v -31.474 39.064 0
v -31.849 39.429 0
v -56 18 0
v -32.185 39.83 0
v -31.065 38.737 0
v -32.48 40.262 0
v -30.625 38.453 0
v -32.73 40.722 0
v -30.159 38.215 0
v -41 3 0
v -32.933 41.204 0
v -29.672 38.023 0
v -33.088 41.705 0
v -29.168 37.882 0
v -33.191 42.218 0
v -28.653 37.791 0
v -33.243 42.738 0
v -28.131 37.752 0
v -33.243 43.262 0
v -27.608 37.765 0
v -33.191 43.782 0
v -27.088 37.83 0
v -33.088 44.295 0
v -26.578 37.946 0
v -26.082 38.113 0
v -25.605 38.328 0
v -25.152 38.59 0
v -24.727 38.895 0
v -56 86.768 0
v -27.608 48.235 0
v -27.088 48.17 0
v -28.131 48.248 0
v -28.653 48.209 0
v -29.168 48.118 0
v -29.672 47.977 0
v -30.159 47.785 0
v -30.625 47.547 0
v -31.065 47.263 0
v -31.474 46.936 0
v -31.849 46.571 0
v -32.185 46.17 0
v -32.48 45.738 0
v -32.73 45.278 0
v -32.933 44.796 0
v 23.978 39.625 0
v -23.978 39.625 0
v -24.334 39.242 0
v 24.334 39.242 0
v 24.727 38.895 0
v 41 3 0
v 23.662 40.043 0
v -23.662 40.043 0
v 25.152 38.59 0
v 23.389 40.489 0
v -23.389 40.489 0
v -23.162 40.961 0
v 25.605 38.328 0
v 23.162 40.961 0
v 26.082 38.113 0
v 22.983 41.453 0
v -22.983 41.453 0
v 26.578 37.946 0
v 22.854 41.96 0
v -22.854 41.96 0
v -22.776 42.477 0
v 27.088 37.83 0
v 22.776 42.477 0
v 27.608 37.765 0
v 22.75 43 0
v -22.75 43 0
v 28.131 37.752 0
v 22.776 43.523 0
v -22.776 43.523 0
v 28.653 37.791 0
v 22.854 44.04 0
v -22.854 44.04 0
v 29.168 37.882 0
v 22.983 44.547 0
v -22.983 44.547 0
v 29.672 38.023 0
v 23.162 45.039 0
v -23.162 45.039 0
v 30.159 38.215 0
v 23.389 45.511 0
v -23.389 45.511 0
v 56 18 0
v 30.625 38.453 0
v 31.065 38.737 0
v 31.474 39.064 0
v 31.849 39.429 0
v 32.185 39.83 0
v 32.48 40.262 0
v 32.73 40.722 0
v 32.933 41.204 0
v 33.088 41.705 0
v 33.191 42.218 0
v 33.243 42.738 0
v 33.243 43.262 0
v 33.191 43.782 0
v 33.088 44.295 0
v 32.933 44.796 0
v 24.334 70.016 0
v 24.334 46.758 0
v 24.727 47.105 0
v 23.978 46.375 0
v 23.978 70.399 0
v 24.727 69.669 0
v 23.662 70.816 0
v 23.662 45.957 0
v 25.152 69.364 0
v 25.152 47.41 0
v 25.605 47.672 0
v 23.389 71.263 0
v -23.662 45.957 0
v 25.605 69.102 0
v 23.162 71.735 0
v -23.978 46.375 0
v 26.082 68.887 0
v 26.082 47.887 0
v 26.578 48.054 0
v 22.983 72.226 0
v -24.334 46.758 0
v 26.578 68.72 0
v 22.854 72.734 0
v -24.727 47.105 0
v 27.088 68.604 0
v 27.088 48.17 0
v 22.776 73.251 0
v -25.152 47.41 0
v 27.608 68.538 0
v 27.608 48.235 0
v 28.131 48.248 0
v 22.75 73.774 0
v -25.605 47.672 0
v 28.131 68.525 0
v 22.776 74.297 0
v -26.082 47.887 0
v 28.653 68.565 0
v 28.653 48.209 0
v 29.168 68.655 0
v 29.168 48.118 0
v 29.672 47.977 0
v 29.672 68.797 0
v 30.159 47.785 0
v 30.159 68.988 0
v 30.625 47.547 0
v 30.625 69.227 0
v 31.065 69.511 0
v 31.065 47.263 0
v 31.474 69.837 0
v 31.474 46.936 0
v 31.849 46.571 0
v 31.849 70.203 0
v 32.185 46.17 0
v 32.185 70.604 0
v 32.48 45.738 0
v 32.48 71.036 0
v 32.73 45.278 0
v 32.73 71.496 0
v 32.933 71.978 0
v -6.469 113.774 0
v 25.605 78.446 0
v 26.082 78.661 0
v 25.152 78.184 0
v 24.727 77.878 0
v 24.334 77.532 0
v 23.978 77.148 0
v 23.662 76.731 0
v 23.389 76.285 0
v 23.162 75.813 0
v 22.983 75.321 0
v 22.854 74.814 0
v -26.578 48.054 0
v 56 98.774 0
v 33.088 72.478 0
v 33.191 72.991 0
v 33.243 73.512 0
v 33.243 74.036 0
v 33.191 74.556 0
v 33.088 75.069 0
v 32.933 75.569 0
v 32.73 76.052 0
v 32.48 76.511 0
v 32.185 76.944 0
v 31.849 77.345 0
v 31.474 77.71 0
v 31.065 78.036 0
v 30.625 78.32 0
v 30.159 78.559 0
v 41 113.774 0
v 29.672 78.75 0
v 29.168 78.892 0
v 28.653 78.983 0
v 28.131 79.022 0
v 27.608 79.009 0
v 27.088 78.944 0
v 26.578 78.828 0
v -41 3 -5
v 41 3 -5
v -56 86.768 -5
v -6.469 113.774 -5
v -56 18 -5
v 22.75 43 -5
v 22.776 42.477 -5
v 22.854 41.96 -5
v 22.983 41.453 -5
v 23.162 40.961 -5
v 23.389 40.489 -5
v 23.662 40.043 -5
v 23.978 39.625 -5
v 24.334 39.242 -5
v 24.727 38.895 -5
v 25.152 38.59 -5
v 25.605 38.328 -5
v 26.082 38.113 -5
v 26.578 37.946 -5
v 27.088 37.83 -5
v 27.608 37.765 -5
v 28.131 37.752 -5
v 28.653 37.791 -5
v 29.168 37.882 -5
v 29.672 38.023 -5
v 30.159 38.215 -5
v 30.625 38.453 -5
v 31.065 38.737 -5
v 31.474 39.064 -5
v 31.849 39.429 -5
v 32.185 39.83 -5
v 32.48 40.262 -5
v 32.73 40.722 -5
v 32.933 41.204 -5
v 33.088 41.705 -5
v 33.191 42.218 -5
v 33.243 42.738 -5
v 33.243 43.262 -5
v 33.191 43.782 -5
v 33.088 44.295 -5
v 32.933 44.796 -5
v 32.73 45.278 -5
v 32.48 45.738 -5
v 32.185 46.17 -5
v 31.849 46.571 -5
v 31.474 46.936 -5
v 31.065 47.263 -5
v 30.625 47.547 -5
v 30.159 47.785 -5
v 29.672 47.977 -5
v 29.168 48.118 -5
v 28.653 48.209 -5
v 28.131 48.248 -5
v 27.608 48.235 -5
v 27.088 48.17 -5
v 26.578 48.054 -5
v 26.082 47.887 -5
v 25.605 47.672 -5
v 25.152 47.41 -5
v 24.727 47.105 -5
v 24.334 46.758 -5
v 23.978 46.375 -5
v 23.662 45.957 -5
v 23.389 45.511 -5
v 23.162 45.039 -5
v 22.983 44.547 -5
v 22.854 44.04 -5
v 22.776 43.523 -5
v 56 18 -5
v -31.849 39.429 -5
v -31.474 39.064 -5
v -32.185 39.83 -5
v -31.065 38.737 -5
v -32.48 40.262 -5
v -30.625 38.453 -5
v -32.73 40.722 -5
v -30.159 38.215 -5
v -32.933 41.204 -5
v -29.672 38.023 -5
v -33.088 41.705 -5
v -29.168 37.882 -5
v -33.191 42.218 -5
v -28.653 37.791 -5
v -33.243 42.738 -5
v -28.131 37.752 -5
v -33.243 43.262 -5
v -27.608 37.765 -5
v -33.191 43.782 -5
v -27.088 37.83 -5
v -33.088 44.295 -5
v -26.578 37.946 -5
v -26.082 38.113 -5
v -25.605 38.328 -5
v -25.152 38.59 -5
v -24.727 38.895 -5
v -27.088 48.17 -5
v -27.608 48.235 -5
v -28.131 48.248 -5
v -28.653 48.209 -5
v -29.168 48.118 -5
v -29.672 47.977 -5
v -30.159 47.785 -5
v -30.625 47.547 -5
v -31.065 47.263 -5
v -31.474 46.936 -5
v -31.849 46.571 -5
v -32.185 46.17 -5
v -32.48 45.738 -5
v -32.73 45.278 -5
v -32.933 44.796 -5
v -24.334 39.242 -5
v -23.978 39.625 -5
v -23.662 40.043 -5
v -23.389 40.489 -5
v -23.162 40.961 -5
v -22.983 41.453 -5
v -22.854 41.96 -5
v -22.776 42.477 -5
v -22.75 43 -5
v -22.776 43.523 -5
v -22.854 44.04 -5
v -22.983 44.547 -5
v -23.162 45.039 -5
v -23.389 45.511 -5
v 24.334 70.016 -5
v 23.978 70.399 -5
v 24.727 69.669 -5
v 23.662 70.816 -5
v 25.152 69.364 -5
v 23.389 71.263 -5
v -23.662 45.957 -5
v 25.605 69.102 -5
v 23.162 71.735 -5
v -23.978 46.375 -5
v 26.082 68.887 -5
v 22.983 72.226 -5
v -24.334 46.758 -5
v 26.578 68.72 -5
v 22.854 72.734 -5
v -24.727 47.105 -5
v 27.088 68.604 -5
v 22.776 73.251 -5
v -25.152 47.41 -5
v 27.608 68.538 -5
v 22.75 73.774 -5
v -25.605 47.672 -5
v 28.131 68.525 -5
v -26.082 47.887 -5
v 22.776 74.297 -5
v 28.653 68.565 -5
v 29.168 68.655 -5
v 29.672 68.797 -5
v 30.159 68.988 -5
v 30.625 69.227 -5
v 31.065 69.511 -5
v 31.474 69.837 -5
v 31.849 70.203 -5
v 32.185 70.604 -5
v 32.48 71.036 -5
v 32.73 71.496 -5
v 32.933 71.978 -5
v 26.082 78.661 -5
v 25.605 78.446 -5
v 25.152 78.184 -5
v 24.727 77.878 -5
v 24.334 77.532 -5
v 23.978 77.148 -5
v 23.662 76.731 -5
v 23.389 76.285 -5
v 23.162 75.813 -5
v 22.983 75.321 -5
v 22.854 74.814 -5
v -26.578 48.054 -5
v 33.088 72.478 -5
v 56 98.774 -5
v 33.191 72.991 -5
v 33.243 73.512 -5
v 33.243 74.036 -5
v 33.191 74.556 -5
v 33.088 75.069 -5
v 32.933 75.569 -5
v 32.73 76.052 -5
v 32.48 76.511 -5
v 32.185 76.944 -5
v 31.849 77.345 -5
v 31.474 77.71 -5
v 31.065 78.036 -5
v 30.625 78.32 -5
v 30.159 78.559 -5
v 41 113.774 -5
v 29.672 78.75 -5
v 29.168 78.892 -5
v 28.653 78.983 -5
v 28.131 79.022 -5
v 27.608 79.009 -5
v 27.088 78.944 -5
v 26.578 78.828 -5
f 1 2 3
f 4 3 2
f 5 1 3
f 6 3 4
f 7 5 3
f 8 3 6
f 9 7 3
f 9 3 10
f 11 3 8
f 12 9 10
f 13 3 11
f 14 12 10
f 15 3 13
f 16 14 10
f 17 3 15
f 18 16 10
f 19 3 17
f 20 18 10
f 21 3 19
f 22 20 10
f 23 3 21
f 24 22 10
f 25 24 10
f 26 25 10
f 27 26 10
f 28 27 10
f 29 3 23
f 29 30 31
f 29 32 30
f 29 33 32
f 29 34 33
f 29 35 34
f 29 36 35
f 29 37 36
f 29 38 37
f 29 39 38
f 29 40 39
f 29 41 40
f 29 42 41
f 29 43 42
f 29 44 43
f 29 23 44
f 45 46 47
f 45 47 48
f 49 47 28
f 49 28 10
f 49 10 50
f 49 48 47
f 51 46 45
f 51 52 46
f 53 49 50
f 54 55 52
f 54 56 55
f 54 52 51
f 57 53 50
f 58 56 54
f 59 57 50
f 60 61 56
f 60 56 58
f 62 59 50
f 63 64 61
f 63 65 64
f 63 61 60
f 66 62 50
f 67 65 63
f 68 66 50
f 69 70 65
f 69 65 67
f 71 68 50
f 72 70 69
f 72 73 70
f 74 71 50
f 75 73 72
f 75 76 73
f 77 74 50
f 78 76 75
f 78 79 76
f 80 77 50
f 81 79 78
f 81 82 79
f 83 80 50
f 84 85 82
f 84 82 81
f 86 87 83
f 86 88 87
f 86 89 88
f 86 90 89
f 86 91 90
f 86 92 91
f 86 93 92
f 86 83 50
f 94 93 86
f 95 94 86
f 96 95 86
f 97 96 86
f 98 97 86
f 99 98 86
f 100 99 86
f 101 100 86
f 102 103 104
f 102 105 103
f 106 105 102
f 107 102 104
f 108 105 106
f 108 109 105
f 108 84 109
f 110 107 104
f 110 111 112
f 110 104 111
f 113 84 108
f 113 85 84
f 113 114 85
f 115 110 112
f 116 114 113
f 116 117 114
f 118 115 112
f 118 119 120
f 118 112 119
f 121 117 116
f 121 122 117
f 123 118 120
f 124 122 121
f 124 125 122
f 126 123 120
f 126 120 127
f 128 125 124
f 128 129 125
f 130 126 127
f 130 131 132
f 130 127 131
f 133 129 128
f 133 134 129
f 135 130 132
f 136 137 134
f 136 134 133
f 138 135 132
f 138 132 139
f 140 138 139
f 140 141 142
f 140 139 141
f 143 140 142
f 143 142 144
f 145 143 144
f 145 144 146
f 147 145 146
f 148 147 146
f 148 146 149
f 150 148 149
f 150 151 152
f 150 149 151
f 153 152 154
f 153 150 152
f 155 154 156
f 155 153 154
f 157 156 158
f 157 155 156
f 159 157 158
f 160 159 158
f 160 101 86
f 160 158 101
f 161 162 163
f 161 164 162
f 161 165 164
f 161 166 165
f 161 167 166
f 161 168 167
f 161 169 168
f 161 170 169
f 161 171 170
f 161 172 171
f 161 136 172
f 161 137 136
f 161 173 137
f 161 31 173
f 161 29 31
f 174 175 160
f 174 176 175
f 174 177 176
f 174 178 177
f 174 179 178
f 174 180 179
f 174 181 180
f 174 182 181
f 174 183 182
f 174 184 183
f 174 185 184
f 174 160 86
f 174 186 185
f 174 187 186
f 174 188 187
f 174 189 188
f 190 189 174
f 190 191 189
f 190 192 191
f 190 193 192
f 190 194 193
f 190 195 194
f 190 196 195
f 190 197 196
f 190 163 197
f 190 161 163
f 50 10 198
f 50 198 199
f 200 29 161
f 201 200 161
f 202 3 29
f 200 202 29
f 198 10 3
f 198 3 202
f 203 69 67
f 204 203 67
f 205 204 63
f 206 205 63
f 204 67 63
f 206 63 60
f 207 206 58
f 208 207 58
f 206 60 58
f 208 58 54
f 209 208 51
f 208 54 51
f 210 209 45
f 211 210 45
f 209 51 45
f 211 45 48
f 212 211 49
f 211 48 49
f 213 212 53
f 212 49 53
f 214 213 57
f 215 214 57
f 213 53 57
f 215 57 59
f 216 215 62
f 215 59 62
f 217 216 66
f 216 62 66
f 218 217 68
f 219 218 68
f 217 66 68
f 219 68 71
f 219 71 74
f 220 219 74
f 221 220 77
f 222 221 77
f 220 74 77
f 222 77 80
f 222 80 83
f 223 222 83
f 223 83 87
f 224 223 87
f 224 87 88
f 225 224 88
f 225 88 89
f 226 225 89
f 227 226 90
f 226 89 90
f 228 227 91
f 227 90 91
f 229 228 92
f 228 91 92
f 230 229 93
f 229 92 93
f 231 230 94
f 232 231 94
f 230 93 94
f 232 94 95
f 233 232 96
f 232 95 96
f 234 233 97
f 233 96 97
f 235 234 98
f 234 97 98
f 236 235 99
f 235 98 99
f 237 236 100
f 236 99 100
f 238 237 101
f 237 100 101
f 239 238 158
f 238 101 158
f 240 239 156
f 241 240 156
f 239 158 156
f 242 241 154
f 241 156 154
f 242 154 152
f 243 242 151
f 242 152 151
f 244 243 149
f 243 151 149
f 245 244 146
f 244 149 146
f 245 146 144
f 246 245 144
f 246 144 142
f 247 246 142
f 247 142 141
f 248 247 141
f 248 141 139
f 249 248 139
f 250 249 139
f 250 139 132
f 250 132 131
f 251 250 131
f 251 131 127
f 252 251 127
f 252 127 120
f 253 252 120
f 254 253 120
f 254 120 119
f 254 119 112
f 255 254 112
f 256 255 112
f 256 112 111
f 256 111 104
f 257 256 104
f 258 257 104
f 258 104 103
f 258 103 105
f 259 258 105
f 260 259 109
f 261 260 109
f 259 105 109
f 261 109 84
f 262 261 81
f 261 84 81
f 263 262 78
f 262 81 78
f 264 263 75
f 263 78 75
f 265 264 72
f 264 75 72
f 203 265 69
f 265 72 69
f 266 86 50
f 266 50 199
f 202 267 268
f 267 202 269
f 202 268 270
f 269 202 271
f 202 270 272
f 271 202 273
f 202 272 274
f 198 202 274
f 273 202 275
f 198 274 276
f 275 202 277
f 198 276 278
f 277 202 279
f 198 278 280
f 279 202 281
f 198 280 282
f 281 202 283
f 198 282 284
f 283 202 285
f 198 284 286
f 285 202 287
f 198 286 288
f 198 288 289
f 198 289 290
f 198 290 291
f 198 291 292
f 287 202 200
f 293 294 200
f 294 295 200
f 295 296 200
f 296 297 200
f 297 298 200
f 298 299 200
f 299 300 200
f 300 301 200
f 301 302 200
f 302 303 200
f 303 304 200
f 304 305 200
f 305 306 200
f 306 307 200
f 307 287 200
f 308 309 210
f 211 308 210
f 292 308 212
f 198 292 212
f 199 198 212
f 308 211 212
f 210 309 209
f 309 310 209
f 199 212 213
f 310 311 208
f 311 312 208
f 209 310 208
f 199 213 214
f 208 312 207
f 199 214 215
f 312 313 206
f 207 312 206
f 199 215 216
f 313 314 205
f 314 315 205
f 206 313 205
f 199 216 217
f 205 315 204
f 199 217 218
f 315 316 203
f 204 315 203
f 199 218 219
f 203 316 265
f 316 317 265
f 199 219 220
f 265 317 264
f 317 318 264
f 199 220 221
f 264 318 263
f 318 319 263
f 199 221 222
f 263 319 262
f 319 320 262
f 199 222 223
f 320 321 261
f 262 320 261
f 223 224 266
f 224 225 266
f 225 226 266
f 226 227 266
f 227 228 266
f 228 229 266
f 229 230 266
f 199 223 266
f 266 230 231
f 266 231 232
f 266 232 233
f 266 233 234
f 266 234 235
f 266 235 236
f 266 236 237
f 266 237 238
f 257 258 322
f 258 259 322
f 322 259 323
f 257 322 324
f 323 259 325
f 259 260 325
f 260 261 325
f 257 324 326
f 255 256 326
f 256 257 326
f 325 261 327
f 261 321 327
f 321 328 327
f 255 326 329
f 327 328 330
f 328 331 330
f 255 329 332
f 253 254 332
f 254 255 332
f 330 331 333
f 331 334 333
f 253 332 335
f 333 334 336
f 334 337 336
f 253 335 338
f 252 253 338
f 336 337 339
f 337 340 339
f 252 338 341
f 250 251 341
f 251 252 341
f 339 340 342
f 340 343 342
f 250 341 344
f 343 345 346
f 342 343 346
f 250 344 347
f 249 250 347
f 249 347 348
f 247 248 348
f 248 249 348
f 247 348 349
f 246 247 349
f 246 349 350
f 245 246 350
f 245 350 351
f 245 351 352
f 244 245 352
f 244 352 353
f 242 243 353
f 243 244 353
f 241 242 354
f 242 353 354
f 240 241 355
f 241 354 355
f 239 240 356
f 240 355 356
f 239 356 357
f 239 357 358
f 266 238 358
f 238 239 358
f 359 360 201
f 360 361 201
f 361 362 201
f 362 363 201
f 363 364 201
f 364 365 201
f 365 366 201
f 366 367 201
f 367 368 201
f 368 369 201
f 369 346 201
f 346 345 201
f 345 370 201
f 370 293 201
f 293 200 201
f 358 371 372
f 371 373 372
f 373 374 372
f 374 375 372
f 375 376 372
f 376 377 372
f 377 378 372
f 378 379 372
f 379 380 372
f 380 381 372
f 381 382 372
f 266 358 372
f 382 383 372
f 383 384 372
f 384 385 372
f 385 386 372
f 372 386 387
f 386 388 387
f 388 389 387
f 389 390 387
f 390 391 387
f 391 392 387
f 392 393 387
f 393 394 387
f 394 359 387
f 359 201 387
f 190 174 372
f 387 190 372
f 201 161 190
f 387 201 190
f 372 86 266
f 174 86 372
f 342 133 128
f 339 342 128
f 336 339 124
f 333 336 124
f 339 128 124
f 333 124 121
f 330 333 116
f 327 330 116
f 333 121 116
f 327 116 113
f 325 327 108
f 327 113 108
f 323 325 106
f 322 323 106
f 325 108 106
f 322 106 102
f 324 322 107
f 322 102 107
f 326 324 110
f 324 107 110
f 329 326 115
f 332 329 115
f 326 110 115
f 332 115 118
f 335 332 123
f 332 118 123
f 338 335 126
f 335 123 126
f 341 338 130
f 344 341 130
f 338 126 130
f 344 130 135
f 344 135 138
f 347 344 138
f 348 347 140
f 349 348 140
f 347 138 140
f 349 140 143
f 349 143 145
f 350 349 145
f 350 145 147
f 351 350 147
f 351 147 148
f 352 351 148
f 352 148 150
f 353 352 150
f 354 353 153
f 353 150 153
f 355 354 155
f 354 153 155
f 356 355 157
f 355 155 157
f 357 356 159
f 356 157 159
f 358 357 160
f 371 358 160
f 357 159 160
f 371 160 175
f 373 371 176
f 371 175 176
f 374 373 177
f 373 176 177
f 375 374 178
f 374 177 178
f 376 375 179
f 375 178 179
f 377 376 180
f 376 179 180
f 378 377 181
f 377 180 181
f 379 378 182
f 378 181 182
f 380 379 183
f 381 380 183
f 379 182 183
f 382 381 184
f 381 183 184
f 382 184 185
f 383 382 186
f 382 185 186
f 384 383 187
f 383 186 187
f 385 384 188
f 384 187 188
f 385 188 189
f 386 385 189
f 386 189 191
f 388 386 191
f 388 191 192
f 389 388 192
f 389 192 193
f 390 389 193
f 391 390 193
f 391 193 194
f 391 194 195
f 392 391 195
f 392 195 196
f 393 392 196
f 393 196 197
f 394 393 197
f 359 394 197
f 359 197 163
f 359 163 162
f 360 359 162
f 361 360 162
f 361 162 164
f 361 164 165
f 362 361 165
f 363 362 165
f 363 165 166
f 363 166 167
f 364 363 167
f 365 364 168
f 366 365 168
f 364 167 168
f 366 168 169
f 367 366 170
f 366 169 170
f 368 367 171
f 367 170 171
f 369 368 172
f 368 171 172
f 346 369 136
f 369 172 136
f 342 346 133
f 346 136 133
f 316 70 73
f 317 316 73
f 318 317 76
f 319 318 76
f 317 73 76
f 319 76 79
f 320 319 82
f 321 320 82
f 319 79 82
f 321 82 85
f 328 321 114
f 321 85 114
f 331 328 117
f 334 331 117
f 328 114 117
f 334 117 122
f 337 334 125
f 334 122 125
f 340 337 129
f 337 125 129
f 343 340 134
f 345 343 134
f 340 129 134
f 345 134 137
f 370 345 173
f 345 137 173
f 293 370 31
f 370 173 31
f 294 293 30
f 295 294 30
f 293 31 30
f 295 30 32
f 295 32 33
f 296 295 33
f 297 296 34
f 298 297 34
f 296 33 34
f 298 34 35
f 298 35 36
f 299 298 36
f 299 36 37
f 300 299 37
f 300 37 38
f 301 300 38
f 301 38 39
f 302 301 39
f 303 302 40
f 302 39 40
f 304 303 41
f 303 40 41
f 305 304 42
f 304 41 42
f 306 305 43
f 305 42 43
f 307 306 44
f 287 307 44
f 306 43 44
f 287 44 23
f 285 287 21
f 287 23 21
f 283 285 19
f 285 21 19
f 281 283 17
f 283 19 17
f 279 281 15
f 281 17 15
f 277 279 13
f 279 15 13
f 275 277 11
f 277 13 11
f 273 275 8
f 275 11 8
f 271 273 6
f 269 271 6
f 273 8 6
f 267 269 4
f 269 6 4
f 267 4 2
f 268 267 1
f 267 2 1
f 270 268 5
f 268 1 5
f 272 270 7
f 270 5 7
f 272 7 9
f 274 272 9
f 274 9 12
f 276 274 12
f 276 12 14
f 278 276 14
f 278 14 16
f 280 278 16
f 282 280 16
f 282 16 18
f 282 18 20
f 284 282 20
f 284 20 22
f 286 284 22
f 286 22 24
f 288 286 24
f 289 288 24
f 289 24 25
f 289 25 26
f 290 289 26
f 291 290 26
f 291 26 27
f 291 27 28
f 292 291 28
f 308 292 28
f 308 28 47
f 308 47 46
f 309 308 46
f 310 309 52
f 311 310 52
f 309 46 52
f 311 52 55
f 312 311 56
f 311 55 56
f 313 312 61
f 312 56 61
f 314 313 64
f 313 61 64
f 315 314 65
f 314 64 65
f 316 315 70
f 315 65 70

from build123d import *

# Parameters (mm, degrees)
SKETCH_1_W             = 112
SKETCH_1_H             = 110.77381068
SKETCH_1_R             = 5.25
SM_BASE_FLANGE_1_DEPTH = 5
CHAMFER_1_SIZE         = 15
CUT_EXTRUDE_1_DEPTH    = 10


# Sheet-metal steps are written as plain solids
with BuildPart() as part:
    # Sketch 1 → Базовая кромка1 (new body)
    with BuildSketch(Plane.XY):
        with Locations((0, 58.38690534)):
            Rectangle(SKETCH_1_W, SKETCH_1_H)
        with Locations((-28, 43)):
            Circle(SKETCH_1_R, mode=Mode.SUBTRACT)
        with Locations(Location((28, 73.77381068, 0), (0, 0, 180))):
            Circle(SKETCH_1_R, mode=Mode.SUBTRACT)
        with Locations(Location((28, 43, 0), (0, 0, 180))):
            Circle(SKETCH_1_R, mode=Mode.SUBTRACT)
    extrude(amount=-SM_BASE_FLANGE_1_DEPTH)

    # Фаска1
    chamfer_1_edges = [part.edges().sort_by_distance(p)[0] for p in [
        (56, 3, -2.5),
        (-56, 3, -2.5),
        (-56, 113.77381068, -2.5),
        (56, 113.77381068, -2.5),
    ]]
    chamfer(chamfer_1_edges, length=CHAMFER_1_SIZE)

    # Sketch 2 → Вырез-Вытянуть1 (cut)
    with BuildSketch(Plane.XY):
        Polygon((-56, 113.77381068), (-56, 86.768448621), (-6.468509112, 113.77381068), align=None)
    extrude(amount=-CUT_EXTRUDE_1_DEPTH, mode=Mode.SUBTRACT)


solid = part.part
